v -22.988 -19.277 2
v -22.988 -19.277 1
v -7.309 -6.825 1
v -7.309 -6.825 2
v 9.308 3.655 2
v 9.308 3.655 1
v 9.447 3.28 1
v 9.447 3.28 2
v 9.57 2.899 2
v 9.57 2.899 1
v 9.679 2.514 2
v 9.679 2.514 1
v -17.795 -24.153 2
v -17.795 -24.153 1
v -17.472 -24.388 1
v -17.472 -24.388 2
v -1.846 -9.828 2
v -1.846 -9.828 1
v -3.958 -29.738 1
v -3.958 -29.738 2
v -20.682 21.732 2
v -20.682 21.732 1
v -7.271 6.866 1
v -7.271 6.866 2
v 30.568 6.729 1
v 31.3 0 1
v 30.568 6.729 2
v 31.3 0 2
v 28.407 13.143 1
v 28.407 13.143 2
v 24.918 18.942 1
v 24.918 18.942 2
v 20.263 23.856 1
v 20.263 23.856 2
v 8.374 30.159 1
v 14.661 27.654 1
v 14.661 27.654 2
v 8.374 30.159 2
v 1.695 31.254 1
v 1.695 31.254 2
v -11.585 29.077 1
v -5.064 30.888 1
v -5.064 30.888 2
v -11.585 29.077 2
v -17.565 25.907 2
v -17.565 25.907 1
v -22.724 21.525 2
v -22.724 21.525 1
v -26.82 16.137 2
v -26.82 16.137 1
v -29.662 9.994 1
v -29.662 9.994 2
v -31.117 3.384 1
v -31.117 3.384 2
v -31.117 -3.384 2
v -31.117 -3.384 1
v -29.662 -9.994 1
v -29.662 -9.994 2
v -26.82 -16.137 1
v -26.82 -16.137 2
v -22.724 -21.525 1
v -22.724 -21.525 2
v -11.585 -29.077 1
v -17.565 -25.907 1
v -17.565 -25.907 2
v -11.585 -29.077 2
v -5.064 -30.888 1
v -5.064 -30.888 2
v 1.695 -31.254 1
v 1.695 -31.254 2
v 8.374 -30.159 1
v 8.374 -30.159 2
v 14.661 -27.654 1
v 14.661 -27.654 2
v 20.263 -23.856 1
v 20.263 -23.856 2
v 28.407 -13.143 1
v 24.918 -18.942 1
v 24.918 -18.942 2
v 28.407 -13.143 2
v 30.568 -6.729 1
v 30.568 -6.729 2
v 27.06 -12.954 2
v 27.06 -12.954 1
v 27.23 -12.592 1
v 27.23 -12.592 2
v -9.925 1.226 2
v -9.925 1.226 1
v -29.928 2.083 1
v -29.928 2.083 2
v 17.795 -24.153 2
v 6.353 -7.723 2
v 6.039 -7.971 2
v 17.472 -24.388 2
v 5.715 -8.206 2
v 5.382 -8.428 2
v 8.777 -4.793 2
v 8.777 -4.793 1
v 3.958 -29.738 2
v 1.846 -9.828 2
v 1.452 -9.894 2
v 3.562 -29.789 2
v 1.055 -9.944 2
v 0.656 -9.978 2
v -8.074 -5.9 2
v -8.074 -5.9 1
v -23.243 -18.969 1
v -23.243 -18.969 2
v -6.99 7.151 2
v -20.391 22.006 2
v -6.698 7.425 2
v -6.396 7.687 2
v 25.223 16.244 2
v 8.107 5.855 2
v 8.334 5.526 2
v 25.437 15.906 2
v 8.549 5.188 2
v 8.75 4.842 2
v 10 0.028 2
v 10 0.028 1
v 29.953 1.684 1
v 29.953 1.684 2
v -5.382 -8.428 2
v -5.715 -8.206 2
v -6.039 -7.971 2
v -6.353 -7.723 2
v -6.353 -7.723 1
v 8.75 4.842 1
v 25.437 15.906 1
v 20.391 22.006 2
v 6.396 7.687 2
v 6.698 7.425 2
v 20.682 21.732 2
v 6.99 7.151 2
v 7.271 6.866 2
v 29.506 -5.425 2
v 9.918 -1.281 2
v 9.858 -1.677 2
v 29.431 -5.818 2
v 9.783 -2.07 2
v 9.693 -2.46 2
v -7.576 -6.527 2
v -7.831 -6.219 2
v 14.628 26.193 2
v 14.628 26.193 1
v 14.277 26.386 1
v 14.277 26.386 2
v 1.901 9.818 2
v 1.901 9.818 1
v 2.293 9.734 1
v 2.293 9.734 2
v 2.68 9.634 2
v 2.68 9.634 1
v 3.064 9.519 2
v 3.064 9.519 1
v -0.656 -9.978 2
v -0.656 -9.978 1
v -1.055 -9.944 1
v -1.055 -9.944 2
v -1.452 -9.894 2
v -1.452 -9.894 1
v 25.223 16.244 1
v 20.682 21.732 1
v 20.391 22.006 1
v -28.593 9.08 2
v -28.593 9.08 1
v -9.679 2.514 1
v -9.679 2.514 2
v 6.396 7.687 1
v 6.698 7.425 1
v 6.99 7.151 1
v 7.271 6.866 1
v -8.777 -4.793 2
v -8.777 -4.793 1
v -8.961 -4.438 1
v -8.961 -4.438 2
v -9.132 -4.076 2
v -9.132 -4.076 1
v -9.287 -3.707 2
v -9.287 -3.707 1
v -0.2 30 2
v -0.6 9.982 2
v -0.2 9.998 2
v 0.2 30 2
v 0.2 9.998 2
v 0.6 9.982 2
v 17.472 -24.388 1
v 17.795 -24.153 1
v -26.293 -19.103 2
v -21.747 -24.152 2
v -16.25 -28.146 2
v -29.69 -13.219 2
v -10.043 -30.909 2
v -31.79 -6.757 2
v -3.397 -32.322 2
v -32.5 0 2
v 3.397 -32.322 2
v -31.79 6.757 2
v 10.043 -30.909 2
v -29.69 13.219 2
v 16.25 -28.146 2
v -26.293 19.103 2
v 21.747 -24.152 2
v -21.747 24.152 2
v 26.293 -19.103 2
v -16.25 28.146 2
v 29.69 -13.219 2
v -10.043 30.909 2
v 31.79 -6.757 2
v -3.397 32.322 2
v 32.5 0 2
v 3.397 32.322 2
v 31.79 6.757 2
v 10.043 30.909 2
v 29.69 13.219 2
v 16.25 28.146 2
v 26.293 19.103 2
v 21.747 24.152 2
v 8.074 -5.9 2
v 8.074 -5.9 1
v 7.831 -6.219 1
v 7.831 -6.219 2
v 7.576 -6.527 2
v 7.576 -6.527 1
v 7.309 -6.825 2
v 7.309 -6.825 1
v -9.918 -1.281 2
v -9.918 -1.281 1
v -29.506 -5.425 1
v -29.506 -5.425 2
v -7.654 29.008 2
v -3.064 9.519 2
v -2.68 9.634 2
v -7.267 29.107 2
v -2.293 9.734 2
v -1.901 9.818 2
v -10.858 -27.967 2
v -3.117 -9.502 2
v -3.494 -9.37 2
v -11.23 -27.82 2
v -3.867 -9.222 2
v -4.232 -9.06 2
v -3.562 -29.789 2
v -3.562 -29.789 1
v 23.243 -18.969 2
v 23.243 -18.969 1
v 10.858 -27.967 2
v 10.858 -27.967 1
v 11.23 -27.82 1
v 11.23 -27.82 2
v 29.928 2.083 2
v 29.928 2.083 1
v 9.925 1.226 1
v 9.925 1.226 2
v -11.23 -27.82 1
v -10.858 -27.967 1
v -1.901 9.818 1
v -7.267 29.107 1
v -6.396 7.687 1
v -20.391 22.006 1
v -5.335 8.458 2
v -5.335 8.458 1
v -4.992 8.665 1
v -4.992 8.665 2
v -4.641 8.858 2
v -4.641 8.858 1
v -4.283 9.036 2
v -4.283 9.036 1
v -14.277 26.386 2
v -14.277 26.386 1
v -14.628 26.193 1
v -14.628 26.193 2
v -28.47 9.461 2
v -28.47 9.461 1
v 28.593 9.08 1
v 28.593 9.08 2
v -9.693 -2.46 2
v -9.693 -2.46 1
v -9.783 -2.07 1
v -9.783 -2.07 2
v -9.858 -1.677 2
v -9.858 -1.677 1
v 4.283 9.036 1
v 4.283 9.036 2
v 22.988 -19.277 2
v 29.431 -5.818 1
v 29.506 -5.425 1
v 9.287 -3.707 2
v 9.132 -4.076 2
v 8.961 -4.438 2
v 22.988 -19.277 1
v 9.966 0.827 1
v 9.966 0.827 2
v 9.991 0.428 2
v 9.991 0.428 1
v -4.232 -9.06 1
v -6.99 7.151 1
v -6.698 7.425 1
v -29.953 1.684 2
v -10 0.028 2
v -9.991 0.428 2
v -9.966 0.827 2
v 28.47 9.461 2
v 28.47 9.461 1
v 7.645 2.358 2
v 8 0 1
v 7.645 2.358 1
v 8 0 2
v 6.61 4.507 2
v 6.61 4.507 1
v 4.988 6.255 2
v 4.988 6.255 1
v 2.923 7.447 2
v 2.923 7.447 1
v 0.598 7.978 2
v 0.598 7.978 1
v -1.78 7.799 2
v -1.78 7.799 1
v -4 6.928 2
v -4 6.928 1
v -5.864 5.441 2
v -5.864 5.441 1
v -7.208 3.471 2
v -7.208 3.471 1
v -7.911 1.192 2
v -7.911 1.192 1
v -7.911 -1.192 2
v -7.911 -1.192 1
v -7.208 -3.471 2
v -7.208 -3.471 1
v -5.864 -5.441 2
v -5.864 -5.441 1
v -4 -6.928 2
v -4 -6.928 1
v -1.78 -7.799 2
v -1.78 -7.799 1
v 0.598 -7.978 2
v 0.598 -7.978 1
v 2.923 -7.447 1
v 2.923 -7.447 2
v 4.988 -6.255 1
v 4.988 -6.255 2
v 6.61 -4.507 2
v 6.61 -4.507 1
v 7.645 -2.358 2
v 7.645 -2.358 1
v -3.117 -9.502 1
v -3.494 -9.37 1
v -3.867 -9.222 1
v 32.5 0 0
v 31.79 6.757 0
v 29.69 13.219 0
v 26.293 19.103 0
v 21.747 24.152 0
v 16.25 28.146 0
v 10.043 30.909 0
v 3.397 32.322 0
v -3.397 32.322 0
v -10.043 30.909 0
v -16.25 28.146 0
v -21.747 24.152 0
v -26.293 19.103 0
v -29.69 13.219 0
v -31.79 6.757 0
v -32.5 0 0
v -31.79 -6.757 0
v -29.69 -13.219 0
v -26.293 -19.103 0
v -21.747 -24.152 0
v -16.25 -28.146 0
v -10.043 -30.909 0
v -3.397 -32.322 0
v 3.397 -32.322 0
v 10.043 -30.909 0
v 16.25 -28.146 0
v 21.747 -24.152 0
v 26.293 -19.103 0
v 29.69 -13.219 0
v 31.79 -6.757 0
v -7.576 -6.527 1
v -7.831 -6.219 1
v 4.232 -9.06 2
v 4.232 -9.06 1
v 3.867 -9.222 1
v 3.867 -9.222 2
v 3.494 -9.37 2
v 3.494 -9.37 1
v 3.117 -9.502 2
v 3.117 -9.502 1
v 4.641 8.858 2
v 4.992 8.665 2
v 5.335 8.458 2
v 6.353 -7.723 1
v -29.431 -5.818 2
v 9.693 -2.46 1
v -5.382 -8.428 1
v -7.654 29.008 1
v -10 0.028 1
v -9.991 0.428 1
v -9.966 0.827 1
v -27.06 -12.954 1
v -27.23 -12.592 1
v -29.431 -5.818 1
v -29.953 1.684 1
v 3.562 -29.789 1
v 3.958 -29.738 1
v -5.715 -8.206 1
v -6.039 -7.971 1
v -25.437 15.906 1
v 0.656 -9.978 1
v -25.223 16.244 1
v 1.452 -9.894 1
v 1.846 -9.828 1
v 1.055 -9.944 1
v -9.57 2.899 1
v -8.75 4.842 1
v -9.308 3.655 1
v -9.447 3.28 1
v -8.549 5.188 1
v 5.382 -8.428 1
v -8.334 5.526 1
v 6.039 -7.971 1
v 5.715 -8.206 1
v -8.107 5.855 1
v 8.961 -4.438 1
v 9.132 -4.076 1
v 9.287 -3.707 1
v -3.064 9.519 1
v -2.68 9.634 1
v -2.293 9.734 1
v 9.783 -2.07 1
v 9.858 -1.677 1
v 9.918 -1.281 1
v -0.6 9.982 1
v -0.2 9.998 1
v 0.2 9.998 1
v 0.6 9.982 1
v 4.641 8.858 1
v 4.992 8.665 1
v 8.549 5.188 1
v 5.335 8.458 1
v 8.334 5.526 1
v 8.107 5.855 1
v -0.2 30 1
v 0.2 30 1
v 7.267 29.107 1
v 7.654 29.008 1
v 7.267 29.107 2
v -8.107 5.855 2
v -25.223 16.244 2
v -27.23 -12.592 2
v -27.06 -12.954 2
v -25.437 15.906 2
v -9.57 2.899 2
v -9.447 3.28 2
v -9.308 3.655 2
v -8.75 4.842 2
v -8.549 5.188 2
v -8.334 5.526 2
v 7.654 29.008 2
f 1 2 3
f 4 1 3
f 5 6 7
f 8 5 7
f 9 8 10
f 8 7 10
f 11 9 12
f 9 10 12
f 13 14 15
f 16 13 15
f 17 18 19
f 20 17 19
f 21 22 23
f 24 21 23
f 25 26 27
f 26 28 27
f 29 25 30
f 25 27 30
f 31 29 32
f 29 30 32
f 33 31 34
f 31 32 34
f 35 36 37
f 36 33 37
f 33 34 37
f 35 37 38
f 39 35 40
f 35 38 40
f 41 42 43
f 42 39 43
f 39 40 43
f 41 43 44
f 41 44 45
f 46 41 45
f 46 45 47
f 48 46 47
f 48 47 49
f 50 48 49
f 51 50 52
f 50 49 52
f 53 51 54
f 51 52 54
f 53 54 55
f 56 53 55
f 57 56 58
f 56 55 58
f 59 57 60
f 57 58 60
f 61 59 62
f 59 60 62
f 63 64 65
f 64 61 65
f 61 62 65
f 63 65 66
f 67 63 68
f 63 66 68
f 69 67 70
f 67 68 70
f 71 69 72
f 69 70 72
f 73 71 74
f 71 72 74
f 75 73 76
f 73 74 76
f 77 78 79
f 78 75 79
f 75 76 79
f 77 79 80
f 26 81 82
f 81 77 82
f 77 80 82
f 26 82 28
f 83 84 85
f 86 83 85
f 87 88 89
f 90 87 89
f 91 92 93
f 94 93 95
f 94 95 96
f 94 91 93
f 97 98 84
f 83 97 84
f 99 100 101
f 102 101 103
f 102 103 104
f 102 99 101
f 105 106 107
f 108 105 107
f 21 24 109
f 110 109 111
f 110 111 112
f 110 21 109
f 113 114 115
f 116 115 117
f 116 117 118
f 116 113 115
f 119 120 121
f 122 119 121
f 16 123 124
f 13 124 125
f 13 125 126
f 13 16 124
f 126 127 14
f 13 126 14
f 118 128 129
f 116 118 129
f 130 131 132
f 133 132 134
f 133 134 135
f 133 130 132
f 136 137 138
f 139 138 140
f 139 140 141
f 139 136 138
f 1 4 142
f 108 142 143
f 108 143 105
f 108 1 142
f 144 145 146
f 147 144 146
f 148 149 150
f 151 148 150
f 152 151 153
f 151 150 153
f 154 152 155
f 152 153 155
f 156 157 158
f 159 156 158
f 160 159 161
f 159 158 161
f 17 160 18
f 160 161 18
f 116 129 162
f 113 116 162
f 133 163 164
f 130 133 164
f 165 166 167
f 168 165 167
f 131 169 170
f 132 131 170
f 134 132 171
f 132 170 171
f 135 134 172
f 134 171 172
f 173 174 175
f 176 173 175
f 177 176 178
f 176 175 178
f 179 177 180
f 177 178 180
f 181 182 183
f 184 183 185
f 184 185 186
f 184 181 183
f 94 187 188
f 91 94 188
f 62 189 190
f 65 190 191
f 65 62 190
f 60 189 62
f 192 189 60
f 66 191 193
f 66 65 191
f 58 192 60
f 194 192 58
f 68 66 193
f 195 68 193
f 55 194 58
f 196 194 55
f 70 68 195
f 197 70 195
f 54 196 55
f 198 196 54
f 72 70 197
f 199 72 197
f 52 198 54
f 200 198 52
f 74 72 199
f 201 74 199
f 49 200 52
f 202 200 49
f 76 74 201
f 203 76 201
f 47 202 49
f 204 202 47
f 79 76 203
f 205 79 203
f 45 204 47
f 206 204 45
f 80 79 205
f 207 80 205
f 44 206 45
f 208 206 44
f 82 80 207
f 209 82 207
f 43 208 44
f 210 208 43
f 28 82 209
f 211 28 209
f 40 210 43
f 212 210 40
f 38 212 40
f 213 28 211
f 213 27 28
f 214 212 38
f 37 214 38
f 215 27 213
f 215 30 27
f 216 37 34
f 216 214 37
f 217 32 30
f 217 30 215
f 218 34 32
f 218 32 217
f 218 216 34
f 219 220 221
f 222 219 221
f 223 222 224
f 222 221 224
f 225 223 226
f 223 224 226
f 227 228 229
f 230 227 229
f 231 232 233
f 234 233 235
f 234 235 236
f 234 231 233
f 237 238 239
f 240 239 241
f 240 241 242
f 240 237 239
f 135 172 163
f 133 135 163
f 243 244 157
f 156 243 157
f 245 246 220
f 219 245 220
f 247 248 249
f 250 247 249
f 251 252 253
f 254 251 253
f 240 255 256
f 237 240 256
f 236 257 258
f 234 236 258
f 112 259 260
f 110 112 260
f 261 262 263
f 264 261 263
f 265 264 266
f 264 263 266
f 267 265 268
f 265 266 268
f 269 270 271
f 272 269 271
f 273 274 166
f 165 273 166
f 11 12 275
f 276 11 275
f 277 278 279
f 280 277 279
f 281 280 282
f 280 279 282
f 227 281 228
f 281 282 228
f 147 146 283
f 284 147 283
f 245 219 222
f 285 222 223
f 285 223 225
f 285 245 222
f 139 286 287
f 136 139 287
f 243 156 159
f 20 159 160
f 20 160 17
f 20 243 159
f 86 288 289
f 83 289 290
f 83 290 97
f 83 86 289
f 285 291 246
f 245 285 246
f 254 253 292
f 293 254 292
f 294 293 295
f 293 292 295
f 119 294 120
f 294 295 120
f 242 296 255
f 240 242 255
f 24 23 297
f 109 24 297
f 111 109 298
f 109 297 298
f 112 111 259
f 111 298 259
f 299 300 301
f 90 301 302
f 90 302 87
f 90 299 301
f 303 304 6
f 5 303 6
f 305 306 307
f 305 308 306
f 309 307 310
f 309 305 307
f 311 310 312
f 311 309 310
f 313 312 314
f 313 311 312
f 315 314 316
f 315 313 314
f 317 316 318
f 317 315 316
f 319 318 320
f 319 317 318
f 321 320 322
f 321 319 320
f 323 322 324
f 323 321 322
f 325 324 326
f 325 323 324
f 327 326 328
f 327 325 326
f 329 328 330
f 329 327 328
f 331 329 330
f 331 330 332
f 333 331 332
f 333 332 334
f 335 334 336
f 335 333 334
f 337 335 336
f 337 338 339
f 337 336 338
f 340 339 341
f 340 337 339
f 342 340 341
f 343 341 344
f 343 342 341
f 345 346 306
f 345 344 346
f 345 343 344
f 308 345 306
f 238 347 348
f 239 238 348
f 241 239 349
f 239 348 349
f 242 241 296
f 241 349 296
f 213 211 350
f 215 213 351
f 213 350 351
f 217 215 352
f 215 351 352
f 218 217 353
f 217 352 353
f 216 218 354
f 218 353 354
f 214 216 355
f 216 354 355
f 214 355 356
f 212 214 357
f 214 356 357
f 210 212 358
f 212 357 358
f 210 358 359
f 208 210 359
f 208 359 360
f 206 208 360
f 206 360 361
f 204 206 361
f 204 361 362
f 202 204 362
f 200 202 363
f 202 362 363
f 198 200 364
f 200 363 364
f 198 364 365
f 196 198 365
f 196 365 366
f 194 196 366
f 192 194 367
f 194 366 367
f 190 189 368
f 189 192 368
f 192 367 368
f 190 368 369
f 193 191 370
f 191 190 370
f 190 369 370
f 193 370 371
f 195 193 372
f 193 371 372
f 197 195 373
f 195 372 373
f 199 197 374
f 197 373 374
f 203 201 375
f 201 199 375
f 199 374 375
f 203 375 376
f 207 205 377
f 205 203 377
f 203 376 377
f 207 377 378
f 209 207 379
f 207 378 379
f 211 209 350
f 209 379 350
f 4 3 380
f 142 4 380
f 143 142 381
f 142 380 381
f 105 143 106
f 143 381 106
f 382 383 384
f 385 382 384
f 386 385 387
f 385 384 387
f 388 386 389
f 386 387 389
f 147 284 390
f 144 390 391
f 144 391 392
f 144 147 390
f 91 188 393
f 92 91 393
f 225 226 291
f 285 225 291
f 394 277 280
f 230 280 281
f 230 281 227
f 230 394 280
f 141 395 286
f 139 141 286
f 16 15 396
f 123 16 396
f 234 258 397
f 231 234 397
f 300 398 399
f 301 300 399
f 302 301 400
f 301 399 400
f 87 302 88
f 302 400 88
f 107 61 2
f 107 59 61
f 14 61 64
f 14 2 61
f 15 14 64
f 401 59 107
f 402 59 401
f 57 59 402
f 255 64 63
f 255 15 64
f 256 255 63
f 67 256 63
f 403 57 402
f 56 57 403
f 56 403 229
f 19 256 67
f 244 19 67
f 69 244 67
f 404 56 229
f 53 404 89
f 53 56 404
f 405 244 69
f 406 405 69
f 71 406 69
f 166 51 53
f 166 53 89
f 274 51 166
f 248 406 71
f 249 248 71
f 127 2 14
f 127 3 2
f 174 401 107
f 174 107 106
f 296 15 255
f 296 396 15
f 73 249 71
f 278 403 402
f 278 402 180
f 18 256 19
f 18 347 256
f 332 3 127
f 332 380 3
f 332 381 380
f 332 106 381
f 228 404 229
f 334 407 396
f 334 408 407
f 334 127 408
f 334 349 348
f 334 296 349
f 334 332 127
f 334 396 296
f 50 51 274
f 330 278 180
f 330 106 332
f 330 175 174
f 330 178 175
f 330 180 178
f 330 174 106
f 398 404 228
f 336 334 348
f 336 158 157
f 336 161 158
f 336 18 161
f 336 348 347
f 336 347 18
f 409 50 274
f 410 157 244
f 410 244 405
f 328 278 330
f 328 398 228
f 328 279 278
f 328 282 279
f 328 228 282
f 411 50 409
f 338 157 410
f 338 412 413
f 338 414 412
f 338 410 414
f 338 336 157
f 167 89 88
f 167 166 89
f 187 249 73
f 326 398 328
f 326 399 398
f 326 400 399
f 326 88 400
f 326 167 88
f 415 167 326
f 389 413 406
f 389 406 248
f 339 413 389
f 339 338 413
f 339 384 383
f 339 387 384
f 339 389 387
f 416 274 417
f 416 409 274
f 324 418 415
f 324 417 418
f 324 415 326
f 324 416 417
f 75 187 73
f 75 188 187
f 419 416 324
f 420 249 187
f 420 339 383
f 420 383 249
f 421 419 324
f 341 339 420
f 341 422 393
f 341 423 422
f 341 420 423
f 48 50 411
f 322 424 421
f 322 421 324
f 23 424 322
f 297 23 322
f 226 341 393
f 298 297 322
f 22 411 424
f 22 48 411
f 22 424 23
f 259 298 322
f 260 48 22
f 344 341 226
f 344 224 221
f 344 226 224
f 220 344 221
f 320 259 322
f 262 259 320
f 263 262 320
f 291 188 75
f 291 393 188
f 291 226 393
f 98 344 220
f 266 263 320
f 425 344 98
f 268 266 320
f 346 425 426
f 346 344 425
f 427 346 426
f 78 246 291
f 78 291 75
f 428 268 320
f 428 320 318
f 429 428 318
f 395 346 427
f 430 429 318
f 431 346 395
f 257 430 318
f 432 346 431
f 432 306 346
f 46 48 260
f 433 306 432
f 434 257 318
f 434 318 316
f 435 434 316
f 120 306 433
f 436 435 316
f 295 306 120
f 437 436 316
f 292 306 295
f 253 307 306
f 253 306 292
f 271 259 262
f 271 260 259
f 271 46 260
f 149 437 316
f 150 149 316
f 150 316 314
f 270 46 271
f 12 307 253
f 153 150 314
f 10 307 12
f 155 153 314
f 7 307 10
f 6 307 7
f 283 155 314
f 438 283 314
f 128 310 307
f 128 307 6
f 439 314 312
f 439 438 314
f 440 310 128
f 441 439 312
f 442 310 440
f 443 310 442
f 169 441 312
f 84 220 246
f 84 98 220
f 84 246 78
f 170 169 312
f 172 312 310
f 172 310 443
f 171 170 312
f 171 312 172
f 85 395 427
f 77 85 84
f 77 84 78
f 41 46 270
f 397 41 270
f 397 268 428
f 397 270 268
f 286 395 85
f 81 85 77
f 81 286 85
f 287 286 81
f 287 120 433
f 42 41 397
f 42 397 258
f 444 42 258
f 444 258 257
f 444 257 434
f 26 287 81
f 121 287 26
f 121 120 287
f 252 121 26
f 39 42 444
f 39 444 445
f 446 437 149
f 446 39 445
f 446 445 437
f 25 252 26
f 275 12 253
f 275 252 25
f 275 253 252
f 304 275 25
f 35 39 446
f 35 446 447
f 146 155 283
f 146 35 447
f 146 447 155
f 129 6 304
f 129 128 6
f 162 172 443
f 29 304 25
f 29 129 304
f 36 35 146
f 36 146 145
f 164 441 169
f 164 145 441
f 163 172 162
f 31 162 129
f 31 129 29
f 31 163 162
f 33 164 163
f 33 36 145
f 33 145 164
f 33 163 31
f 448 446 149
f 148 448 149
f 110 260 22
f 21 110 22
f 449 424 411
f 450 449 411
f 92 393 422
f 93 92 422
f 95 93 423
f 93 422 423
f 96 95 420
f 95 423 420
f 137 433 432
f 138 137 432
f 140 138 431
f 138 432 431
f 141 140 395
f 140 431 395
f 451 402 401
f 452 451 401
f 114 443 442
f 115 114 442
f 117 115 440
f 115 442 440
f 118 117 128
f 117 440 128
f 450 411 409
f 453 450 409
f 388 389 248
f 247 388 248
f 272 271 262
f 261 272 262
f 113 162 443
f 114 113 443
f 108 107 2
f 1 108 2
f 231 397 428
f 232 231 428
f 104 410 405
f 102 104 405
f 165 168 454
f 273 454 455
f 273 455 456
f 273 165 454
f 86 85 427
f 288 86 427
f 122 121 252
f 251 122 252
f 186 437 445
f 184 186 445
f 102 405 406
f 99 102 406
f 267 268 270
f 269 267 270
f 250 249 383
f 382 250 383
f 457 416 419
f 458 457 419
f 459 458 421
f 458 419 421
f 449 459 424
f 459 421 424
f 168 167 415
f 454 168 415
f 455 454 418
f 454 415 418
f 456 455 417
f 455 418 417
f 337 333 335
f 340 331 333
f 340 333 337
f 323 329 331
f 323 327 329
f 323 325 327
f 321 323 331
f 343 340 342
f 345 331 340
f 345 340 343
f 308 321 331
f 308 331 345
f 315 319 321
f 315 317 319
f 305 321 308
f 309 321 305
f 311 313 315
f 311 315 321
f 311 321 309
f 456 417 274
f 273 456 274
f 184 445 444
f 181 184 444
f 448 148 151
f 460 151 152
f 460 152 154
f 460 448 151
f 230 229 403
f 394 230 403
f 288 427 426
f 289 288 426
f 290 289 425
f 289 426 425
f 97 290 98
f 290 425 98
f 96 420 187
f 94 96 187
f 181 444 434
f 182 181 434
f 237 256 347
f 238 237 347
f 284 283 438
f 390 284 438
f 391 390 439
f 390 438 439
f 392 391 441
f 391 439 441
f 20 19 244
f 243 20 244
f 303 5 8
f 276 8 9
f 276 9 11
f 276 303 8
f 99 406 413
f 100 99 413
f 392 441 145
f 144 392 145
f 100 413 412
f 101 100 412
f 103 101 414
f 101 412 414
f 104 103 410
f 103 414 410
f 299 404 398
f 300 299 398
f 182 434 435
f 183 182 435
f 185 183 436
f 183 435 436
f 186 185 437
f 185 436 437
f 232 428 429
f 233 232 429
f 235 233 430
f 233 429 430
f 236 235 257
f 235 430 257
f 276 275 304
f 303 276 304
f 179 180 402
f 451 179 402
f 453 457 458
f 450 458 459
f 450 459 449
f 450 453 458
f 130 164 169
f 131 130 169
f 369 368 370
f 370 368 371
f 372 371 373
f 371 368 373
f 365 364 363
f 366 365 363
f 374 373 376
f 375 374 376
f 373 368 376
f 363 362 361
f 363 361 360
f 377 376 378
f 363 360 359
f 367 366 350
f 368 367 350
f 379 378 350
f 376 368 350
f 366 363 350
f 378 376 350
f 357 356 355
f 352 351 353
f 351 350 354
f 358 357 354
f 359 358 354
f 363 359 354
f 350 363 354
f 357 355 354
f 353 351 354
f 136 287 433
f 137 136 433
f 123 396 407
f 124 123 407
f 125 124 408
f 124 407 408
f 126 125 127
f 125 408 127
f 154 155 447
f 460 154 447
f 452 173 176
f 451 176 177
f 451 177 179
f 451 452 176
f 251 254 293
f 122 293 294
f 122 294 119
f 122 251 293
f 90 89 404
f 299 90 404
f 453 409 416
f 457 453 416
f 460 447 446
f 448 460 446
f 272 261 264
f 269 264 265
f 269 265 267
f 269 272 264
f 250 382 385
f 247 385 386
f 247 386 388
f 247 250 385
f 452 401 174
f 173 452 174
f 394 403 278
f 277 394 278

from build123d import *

# Parameters (mm, degrees)
F0_R     = 32.5
F1_DEPTH = 2
F2_R     = 31.3
F2_R_2   = 8
F3_DEPTH = 1
F5_DEPTH = 1
F6_COUNT = 25


with BuildPart() as f1:
    # F0 (on Top) → F1 (new body)
    with BuildSketch(Plane.XY):
        Circle(F0_R)
    extrude(amount=F1_DEPTH)

    # F2 (on face) → F3 (cut)
    with BuildSketch(Plane.XY.offset(2)):
        Circle(F2_R)
        Circle(F2_R_2, mode=Mode.SUBTRACT)
    extrude(amount=-F3_DEPTH, mode=Mode.SUBTRACT)

    # F4 (on face) → F5 (join, through all)
    with BuildSketch(Plane.XY.offset(1)):
        with BuildLine():
            ThreePointArc((-0.6, 9.981984), (0, 10), (0.6, 9.981984))
            Line((0.6, 9.981984), (0.2, 30))
            Line((0.2, 30), (0, 30))
            Line((0, 30), (-0.2, 30))
            Line((-0.2, 30), (-0.6, 9.981984))
        make_face()
    extrude(amount=F5_DEPTH)

    # F6: F1 ×25 about axis
    f6_axis = Axis((0, 0, 0), (0, 0, -1))


with BuildPart() as f1_1:
    add(f1.part)
    for i in range(1, F6_COUNT):
        add(f1.part.rotate(f6_axis, i * 360 / F6_COUNT))


solid = f1_1.part
